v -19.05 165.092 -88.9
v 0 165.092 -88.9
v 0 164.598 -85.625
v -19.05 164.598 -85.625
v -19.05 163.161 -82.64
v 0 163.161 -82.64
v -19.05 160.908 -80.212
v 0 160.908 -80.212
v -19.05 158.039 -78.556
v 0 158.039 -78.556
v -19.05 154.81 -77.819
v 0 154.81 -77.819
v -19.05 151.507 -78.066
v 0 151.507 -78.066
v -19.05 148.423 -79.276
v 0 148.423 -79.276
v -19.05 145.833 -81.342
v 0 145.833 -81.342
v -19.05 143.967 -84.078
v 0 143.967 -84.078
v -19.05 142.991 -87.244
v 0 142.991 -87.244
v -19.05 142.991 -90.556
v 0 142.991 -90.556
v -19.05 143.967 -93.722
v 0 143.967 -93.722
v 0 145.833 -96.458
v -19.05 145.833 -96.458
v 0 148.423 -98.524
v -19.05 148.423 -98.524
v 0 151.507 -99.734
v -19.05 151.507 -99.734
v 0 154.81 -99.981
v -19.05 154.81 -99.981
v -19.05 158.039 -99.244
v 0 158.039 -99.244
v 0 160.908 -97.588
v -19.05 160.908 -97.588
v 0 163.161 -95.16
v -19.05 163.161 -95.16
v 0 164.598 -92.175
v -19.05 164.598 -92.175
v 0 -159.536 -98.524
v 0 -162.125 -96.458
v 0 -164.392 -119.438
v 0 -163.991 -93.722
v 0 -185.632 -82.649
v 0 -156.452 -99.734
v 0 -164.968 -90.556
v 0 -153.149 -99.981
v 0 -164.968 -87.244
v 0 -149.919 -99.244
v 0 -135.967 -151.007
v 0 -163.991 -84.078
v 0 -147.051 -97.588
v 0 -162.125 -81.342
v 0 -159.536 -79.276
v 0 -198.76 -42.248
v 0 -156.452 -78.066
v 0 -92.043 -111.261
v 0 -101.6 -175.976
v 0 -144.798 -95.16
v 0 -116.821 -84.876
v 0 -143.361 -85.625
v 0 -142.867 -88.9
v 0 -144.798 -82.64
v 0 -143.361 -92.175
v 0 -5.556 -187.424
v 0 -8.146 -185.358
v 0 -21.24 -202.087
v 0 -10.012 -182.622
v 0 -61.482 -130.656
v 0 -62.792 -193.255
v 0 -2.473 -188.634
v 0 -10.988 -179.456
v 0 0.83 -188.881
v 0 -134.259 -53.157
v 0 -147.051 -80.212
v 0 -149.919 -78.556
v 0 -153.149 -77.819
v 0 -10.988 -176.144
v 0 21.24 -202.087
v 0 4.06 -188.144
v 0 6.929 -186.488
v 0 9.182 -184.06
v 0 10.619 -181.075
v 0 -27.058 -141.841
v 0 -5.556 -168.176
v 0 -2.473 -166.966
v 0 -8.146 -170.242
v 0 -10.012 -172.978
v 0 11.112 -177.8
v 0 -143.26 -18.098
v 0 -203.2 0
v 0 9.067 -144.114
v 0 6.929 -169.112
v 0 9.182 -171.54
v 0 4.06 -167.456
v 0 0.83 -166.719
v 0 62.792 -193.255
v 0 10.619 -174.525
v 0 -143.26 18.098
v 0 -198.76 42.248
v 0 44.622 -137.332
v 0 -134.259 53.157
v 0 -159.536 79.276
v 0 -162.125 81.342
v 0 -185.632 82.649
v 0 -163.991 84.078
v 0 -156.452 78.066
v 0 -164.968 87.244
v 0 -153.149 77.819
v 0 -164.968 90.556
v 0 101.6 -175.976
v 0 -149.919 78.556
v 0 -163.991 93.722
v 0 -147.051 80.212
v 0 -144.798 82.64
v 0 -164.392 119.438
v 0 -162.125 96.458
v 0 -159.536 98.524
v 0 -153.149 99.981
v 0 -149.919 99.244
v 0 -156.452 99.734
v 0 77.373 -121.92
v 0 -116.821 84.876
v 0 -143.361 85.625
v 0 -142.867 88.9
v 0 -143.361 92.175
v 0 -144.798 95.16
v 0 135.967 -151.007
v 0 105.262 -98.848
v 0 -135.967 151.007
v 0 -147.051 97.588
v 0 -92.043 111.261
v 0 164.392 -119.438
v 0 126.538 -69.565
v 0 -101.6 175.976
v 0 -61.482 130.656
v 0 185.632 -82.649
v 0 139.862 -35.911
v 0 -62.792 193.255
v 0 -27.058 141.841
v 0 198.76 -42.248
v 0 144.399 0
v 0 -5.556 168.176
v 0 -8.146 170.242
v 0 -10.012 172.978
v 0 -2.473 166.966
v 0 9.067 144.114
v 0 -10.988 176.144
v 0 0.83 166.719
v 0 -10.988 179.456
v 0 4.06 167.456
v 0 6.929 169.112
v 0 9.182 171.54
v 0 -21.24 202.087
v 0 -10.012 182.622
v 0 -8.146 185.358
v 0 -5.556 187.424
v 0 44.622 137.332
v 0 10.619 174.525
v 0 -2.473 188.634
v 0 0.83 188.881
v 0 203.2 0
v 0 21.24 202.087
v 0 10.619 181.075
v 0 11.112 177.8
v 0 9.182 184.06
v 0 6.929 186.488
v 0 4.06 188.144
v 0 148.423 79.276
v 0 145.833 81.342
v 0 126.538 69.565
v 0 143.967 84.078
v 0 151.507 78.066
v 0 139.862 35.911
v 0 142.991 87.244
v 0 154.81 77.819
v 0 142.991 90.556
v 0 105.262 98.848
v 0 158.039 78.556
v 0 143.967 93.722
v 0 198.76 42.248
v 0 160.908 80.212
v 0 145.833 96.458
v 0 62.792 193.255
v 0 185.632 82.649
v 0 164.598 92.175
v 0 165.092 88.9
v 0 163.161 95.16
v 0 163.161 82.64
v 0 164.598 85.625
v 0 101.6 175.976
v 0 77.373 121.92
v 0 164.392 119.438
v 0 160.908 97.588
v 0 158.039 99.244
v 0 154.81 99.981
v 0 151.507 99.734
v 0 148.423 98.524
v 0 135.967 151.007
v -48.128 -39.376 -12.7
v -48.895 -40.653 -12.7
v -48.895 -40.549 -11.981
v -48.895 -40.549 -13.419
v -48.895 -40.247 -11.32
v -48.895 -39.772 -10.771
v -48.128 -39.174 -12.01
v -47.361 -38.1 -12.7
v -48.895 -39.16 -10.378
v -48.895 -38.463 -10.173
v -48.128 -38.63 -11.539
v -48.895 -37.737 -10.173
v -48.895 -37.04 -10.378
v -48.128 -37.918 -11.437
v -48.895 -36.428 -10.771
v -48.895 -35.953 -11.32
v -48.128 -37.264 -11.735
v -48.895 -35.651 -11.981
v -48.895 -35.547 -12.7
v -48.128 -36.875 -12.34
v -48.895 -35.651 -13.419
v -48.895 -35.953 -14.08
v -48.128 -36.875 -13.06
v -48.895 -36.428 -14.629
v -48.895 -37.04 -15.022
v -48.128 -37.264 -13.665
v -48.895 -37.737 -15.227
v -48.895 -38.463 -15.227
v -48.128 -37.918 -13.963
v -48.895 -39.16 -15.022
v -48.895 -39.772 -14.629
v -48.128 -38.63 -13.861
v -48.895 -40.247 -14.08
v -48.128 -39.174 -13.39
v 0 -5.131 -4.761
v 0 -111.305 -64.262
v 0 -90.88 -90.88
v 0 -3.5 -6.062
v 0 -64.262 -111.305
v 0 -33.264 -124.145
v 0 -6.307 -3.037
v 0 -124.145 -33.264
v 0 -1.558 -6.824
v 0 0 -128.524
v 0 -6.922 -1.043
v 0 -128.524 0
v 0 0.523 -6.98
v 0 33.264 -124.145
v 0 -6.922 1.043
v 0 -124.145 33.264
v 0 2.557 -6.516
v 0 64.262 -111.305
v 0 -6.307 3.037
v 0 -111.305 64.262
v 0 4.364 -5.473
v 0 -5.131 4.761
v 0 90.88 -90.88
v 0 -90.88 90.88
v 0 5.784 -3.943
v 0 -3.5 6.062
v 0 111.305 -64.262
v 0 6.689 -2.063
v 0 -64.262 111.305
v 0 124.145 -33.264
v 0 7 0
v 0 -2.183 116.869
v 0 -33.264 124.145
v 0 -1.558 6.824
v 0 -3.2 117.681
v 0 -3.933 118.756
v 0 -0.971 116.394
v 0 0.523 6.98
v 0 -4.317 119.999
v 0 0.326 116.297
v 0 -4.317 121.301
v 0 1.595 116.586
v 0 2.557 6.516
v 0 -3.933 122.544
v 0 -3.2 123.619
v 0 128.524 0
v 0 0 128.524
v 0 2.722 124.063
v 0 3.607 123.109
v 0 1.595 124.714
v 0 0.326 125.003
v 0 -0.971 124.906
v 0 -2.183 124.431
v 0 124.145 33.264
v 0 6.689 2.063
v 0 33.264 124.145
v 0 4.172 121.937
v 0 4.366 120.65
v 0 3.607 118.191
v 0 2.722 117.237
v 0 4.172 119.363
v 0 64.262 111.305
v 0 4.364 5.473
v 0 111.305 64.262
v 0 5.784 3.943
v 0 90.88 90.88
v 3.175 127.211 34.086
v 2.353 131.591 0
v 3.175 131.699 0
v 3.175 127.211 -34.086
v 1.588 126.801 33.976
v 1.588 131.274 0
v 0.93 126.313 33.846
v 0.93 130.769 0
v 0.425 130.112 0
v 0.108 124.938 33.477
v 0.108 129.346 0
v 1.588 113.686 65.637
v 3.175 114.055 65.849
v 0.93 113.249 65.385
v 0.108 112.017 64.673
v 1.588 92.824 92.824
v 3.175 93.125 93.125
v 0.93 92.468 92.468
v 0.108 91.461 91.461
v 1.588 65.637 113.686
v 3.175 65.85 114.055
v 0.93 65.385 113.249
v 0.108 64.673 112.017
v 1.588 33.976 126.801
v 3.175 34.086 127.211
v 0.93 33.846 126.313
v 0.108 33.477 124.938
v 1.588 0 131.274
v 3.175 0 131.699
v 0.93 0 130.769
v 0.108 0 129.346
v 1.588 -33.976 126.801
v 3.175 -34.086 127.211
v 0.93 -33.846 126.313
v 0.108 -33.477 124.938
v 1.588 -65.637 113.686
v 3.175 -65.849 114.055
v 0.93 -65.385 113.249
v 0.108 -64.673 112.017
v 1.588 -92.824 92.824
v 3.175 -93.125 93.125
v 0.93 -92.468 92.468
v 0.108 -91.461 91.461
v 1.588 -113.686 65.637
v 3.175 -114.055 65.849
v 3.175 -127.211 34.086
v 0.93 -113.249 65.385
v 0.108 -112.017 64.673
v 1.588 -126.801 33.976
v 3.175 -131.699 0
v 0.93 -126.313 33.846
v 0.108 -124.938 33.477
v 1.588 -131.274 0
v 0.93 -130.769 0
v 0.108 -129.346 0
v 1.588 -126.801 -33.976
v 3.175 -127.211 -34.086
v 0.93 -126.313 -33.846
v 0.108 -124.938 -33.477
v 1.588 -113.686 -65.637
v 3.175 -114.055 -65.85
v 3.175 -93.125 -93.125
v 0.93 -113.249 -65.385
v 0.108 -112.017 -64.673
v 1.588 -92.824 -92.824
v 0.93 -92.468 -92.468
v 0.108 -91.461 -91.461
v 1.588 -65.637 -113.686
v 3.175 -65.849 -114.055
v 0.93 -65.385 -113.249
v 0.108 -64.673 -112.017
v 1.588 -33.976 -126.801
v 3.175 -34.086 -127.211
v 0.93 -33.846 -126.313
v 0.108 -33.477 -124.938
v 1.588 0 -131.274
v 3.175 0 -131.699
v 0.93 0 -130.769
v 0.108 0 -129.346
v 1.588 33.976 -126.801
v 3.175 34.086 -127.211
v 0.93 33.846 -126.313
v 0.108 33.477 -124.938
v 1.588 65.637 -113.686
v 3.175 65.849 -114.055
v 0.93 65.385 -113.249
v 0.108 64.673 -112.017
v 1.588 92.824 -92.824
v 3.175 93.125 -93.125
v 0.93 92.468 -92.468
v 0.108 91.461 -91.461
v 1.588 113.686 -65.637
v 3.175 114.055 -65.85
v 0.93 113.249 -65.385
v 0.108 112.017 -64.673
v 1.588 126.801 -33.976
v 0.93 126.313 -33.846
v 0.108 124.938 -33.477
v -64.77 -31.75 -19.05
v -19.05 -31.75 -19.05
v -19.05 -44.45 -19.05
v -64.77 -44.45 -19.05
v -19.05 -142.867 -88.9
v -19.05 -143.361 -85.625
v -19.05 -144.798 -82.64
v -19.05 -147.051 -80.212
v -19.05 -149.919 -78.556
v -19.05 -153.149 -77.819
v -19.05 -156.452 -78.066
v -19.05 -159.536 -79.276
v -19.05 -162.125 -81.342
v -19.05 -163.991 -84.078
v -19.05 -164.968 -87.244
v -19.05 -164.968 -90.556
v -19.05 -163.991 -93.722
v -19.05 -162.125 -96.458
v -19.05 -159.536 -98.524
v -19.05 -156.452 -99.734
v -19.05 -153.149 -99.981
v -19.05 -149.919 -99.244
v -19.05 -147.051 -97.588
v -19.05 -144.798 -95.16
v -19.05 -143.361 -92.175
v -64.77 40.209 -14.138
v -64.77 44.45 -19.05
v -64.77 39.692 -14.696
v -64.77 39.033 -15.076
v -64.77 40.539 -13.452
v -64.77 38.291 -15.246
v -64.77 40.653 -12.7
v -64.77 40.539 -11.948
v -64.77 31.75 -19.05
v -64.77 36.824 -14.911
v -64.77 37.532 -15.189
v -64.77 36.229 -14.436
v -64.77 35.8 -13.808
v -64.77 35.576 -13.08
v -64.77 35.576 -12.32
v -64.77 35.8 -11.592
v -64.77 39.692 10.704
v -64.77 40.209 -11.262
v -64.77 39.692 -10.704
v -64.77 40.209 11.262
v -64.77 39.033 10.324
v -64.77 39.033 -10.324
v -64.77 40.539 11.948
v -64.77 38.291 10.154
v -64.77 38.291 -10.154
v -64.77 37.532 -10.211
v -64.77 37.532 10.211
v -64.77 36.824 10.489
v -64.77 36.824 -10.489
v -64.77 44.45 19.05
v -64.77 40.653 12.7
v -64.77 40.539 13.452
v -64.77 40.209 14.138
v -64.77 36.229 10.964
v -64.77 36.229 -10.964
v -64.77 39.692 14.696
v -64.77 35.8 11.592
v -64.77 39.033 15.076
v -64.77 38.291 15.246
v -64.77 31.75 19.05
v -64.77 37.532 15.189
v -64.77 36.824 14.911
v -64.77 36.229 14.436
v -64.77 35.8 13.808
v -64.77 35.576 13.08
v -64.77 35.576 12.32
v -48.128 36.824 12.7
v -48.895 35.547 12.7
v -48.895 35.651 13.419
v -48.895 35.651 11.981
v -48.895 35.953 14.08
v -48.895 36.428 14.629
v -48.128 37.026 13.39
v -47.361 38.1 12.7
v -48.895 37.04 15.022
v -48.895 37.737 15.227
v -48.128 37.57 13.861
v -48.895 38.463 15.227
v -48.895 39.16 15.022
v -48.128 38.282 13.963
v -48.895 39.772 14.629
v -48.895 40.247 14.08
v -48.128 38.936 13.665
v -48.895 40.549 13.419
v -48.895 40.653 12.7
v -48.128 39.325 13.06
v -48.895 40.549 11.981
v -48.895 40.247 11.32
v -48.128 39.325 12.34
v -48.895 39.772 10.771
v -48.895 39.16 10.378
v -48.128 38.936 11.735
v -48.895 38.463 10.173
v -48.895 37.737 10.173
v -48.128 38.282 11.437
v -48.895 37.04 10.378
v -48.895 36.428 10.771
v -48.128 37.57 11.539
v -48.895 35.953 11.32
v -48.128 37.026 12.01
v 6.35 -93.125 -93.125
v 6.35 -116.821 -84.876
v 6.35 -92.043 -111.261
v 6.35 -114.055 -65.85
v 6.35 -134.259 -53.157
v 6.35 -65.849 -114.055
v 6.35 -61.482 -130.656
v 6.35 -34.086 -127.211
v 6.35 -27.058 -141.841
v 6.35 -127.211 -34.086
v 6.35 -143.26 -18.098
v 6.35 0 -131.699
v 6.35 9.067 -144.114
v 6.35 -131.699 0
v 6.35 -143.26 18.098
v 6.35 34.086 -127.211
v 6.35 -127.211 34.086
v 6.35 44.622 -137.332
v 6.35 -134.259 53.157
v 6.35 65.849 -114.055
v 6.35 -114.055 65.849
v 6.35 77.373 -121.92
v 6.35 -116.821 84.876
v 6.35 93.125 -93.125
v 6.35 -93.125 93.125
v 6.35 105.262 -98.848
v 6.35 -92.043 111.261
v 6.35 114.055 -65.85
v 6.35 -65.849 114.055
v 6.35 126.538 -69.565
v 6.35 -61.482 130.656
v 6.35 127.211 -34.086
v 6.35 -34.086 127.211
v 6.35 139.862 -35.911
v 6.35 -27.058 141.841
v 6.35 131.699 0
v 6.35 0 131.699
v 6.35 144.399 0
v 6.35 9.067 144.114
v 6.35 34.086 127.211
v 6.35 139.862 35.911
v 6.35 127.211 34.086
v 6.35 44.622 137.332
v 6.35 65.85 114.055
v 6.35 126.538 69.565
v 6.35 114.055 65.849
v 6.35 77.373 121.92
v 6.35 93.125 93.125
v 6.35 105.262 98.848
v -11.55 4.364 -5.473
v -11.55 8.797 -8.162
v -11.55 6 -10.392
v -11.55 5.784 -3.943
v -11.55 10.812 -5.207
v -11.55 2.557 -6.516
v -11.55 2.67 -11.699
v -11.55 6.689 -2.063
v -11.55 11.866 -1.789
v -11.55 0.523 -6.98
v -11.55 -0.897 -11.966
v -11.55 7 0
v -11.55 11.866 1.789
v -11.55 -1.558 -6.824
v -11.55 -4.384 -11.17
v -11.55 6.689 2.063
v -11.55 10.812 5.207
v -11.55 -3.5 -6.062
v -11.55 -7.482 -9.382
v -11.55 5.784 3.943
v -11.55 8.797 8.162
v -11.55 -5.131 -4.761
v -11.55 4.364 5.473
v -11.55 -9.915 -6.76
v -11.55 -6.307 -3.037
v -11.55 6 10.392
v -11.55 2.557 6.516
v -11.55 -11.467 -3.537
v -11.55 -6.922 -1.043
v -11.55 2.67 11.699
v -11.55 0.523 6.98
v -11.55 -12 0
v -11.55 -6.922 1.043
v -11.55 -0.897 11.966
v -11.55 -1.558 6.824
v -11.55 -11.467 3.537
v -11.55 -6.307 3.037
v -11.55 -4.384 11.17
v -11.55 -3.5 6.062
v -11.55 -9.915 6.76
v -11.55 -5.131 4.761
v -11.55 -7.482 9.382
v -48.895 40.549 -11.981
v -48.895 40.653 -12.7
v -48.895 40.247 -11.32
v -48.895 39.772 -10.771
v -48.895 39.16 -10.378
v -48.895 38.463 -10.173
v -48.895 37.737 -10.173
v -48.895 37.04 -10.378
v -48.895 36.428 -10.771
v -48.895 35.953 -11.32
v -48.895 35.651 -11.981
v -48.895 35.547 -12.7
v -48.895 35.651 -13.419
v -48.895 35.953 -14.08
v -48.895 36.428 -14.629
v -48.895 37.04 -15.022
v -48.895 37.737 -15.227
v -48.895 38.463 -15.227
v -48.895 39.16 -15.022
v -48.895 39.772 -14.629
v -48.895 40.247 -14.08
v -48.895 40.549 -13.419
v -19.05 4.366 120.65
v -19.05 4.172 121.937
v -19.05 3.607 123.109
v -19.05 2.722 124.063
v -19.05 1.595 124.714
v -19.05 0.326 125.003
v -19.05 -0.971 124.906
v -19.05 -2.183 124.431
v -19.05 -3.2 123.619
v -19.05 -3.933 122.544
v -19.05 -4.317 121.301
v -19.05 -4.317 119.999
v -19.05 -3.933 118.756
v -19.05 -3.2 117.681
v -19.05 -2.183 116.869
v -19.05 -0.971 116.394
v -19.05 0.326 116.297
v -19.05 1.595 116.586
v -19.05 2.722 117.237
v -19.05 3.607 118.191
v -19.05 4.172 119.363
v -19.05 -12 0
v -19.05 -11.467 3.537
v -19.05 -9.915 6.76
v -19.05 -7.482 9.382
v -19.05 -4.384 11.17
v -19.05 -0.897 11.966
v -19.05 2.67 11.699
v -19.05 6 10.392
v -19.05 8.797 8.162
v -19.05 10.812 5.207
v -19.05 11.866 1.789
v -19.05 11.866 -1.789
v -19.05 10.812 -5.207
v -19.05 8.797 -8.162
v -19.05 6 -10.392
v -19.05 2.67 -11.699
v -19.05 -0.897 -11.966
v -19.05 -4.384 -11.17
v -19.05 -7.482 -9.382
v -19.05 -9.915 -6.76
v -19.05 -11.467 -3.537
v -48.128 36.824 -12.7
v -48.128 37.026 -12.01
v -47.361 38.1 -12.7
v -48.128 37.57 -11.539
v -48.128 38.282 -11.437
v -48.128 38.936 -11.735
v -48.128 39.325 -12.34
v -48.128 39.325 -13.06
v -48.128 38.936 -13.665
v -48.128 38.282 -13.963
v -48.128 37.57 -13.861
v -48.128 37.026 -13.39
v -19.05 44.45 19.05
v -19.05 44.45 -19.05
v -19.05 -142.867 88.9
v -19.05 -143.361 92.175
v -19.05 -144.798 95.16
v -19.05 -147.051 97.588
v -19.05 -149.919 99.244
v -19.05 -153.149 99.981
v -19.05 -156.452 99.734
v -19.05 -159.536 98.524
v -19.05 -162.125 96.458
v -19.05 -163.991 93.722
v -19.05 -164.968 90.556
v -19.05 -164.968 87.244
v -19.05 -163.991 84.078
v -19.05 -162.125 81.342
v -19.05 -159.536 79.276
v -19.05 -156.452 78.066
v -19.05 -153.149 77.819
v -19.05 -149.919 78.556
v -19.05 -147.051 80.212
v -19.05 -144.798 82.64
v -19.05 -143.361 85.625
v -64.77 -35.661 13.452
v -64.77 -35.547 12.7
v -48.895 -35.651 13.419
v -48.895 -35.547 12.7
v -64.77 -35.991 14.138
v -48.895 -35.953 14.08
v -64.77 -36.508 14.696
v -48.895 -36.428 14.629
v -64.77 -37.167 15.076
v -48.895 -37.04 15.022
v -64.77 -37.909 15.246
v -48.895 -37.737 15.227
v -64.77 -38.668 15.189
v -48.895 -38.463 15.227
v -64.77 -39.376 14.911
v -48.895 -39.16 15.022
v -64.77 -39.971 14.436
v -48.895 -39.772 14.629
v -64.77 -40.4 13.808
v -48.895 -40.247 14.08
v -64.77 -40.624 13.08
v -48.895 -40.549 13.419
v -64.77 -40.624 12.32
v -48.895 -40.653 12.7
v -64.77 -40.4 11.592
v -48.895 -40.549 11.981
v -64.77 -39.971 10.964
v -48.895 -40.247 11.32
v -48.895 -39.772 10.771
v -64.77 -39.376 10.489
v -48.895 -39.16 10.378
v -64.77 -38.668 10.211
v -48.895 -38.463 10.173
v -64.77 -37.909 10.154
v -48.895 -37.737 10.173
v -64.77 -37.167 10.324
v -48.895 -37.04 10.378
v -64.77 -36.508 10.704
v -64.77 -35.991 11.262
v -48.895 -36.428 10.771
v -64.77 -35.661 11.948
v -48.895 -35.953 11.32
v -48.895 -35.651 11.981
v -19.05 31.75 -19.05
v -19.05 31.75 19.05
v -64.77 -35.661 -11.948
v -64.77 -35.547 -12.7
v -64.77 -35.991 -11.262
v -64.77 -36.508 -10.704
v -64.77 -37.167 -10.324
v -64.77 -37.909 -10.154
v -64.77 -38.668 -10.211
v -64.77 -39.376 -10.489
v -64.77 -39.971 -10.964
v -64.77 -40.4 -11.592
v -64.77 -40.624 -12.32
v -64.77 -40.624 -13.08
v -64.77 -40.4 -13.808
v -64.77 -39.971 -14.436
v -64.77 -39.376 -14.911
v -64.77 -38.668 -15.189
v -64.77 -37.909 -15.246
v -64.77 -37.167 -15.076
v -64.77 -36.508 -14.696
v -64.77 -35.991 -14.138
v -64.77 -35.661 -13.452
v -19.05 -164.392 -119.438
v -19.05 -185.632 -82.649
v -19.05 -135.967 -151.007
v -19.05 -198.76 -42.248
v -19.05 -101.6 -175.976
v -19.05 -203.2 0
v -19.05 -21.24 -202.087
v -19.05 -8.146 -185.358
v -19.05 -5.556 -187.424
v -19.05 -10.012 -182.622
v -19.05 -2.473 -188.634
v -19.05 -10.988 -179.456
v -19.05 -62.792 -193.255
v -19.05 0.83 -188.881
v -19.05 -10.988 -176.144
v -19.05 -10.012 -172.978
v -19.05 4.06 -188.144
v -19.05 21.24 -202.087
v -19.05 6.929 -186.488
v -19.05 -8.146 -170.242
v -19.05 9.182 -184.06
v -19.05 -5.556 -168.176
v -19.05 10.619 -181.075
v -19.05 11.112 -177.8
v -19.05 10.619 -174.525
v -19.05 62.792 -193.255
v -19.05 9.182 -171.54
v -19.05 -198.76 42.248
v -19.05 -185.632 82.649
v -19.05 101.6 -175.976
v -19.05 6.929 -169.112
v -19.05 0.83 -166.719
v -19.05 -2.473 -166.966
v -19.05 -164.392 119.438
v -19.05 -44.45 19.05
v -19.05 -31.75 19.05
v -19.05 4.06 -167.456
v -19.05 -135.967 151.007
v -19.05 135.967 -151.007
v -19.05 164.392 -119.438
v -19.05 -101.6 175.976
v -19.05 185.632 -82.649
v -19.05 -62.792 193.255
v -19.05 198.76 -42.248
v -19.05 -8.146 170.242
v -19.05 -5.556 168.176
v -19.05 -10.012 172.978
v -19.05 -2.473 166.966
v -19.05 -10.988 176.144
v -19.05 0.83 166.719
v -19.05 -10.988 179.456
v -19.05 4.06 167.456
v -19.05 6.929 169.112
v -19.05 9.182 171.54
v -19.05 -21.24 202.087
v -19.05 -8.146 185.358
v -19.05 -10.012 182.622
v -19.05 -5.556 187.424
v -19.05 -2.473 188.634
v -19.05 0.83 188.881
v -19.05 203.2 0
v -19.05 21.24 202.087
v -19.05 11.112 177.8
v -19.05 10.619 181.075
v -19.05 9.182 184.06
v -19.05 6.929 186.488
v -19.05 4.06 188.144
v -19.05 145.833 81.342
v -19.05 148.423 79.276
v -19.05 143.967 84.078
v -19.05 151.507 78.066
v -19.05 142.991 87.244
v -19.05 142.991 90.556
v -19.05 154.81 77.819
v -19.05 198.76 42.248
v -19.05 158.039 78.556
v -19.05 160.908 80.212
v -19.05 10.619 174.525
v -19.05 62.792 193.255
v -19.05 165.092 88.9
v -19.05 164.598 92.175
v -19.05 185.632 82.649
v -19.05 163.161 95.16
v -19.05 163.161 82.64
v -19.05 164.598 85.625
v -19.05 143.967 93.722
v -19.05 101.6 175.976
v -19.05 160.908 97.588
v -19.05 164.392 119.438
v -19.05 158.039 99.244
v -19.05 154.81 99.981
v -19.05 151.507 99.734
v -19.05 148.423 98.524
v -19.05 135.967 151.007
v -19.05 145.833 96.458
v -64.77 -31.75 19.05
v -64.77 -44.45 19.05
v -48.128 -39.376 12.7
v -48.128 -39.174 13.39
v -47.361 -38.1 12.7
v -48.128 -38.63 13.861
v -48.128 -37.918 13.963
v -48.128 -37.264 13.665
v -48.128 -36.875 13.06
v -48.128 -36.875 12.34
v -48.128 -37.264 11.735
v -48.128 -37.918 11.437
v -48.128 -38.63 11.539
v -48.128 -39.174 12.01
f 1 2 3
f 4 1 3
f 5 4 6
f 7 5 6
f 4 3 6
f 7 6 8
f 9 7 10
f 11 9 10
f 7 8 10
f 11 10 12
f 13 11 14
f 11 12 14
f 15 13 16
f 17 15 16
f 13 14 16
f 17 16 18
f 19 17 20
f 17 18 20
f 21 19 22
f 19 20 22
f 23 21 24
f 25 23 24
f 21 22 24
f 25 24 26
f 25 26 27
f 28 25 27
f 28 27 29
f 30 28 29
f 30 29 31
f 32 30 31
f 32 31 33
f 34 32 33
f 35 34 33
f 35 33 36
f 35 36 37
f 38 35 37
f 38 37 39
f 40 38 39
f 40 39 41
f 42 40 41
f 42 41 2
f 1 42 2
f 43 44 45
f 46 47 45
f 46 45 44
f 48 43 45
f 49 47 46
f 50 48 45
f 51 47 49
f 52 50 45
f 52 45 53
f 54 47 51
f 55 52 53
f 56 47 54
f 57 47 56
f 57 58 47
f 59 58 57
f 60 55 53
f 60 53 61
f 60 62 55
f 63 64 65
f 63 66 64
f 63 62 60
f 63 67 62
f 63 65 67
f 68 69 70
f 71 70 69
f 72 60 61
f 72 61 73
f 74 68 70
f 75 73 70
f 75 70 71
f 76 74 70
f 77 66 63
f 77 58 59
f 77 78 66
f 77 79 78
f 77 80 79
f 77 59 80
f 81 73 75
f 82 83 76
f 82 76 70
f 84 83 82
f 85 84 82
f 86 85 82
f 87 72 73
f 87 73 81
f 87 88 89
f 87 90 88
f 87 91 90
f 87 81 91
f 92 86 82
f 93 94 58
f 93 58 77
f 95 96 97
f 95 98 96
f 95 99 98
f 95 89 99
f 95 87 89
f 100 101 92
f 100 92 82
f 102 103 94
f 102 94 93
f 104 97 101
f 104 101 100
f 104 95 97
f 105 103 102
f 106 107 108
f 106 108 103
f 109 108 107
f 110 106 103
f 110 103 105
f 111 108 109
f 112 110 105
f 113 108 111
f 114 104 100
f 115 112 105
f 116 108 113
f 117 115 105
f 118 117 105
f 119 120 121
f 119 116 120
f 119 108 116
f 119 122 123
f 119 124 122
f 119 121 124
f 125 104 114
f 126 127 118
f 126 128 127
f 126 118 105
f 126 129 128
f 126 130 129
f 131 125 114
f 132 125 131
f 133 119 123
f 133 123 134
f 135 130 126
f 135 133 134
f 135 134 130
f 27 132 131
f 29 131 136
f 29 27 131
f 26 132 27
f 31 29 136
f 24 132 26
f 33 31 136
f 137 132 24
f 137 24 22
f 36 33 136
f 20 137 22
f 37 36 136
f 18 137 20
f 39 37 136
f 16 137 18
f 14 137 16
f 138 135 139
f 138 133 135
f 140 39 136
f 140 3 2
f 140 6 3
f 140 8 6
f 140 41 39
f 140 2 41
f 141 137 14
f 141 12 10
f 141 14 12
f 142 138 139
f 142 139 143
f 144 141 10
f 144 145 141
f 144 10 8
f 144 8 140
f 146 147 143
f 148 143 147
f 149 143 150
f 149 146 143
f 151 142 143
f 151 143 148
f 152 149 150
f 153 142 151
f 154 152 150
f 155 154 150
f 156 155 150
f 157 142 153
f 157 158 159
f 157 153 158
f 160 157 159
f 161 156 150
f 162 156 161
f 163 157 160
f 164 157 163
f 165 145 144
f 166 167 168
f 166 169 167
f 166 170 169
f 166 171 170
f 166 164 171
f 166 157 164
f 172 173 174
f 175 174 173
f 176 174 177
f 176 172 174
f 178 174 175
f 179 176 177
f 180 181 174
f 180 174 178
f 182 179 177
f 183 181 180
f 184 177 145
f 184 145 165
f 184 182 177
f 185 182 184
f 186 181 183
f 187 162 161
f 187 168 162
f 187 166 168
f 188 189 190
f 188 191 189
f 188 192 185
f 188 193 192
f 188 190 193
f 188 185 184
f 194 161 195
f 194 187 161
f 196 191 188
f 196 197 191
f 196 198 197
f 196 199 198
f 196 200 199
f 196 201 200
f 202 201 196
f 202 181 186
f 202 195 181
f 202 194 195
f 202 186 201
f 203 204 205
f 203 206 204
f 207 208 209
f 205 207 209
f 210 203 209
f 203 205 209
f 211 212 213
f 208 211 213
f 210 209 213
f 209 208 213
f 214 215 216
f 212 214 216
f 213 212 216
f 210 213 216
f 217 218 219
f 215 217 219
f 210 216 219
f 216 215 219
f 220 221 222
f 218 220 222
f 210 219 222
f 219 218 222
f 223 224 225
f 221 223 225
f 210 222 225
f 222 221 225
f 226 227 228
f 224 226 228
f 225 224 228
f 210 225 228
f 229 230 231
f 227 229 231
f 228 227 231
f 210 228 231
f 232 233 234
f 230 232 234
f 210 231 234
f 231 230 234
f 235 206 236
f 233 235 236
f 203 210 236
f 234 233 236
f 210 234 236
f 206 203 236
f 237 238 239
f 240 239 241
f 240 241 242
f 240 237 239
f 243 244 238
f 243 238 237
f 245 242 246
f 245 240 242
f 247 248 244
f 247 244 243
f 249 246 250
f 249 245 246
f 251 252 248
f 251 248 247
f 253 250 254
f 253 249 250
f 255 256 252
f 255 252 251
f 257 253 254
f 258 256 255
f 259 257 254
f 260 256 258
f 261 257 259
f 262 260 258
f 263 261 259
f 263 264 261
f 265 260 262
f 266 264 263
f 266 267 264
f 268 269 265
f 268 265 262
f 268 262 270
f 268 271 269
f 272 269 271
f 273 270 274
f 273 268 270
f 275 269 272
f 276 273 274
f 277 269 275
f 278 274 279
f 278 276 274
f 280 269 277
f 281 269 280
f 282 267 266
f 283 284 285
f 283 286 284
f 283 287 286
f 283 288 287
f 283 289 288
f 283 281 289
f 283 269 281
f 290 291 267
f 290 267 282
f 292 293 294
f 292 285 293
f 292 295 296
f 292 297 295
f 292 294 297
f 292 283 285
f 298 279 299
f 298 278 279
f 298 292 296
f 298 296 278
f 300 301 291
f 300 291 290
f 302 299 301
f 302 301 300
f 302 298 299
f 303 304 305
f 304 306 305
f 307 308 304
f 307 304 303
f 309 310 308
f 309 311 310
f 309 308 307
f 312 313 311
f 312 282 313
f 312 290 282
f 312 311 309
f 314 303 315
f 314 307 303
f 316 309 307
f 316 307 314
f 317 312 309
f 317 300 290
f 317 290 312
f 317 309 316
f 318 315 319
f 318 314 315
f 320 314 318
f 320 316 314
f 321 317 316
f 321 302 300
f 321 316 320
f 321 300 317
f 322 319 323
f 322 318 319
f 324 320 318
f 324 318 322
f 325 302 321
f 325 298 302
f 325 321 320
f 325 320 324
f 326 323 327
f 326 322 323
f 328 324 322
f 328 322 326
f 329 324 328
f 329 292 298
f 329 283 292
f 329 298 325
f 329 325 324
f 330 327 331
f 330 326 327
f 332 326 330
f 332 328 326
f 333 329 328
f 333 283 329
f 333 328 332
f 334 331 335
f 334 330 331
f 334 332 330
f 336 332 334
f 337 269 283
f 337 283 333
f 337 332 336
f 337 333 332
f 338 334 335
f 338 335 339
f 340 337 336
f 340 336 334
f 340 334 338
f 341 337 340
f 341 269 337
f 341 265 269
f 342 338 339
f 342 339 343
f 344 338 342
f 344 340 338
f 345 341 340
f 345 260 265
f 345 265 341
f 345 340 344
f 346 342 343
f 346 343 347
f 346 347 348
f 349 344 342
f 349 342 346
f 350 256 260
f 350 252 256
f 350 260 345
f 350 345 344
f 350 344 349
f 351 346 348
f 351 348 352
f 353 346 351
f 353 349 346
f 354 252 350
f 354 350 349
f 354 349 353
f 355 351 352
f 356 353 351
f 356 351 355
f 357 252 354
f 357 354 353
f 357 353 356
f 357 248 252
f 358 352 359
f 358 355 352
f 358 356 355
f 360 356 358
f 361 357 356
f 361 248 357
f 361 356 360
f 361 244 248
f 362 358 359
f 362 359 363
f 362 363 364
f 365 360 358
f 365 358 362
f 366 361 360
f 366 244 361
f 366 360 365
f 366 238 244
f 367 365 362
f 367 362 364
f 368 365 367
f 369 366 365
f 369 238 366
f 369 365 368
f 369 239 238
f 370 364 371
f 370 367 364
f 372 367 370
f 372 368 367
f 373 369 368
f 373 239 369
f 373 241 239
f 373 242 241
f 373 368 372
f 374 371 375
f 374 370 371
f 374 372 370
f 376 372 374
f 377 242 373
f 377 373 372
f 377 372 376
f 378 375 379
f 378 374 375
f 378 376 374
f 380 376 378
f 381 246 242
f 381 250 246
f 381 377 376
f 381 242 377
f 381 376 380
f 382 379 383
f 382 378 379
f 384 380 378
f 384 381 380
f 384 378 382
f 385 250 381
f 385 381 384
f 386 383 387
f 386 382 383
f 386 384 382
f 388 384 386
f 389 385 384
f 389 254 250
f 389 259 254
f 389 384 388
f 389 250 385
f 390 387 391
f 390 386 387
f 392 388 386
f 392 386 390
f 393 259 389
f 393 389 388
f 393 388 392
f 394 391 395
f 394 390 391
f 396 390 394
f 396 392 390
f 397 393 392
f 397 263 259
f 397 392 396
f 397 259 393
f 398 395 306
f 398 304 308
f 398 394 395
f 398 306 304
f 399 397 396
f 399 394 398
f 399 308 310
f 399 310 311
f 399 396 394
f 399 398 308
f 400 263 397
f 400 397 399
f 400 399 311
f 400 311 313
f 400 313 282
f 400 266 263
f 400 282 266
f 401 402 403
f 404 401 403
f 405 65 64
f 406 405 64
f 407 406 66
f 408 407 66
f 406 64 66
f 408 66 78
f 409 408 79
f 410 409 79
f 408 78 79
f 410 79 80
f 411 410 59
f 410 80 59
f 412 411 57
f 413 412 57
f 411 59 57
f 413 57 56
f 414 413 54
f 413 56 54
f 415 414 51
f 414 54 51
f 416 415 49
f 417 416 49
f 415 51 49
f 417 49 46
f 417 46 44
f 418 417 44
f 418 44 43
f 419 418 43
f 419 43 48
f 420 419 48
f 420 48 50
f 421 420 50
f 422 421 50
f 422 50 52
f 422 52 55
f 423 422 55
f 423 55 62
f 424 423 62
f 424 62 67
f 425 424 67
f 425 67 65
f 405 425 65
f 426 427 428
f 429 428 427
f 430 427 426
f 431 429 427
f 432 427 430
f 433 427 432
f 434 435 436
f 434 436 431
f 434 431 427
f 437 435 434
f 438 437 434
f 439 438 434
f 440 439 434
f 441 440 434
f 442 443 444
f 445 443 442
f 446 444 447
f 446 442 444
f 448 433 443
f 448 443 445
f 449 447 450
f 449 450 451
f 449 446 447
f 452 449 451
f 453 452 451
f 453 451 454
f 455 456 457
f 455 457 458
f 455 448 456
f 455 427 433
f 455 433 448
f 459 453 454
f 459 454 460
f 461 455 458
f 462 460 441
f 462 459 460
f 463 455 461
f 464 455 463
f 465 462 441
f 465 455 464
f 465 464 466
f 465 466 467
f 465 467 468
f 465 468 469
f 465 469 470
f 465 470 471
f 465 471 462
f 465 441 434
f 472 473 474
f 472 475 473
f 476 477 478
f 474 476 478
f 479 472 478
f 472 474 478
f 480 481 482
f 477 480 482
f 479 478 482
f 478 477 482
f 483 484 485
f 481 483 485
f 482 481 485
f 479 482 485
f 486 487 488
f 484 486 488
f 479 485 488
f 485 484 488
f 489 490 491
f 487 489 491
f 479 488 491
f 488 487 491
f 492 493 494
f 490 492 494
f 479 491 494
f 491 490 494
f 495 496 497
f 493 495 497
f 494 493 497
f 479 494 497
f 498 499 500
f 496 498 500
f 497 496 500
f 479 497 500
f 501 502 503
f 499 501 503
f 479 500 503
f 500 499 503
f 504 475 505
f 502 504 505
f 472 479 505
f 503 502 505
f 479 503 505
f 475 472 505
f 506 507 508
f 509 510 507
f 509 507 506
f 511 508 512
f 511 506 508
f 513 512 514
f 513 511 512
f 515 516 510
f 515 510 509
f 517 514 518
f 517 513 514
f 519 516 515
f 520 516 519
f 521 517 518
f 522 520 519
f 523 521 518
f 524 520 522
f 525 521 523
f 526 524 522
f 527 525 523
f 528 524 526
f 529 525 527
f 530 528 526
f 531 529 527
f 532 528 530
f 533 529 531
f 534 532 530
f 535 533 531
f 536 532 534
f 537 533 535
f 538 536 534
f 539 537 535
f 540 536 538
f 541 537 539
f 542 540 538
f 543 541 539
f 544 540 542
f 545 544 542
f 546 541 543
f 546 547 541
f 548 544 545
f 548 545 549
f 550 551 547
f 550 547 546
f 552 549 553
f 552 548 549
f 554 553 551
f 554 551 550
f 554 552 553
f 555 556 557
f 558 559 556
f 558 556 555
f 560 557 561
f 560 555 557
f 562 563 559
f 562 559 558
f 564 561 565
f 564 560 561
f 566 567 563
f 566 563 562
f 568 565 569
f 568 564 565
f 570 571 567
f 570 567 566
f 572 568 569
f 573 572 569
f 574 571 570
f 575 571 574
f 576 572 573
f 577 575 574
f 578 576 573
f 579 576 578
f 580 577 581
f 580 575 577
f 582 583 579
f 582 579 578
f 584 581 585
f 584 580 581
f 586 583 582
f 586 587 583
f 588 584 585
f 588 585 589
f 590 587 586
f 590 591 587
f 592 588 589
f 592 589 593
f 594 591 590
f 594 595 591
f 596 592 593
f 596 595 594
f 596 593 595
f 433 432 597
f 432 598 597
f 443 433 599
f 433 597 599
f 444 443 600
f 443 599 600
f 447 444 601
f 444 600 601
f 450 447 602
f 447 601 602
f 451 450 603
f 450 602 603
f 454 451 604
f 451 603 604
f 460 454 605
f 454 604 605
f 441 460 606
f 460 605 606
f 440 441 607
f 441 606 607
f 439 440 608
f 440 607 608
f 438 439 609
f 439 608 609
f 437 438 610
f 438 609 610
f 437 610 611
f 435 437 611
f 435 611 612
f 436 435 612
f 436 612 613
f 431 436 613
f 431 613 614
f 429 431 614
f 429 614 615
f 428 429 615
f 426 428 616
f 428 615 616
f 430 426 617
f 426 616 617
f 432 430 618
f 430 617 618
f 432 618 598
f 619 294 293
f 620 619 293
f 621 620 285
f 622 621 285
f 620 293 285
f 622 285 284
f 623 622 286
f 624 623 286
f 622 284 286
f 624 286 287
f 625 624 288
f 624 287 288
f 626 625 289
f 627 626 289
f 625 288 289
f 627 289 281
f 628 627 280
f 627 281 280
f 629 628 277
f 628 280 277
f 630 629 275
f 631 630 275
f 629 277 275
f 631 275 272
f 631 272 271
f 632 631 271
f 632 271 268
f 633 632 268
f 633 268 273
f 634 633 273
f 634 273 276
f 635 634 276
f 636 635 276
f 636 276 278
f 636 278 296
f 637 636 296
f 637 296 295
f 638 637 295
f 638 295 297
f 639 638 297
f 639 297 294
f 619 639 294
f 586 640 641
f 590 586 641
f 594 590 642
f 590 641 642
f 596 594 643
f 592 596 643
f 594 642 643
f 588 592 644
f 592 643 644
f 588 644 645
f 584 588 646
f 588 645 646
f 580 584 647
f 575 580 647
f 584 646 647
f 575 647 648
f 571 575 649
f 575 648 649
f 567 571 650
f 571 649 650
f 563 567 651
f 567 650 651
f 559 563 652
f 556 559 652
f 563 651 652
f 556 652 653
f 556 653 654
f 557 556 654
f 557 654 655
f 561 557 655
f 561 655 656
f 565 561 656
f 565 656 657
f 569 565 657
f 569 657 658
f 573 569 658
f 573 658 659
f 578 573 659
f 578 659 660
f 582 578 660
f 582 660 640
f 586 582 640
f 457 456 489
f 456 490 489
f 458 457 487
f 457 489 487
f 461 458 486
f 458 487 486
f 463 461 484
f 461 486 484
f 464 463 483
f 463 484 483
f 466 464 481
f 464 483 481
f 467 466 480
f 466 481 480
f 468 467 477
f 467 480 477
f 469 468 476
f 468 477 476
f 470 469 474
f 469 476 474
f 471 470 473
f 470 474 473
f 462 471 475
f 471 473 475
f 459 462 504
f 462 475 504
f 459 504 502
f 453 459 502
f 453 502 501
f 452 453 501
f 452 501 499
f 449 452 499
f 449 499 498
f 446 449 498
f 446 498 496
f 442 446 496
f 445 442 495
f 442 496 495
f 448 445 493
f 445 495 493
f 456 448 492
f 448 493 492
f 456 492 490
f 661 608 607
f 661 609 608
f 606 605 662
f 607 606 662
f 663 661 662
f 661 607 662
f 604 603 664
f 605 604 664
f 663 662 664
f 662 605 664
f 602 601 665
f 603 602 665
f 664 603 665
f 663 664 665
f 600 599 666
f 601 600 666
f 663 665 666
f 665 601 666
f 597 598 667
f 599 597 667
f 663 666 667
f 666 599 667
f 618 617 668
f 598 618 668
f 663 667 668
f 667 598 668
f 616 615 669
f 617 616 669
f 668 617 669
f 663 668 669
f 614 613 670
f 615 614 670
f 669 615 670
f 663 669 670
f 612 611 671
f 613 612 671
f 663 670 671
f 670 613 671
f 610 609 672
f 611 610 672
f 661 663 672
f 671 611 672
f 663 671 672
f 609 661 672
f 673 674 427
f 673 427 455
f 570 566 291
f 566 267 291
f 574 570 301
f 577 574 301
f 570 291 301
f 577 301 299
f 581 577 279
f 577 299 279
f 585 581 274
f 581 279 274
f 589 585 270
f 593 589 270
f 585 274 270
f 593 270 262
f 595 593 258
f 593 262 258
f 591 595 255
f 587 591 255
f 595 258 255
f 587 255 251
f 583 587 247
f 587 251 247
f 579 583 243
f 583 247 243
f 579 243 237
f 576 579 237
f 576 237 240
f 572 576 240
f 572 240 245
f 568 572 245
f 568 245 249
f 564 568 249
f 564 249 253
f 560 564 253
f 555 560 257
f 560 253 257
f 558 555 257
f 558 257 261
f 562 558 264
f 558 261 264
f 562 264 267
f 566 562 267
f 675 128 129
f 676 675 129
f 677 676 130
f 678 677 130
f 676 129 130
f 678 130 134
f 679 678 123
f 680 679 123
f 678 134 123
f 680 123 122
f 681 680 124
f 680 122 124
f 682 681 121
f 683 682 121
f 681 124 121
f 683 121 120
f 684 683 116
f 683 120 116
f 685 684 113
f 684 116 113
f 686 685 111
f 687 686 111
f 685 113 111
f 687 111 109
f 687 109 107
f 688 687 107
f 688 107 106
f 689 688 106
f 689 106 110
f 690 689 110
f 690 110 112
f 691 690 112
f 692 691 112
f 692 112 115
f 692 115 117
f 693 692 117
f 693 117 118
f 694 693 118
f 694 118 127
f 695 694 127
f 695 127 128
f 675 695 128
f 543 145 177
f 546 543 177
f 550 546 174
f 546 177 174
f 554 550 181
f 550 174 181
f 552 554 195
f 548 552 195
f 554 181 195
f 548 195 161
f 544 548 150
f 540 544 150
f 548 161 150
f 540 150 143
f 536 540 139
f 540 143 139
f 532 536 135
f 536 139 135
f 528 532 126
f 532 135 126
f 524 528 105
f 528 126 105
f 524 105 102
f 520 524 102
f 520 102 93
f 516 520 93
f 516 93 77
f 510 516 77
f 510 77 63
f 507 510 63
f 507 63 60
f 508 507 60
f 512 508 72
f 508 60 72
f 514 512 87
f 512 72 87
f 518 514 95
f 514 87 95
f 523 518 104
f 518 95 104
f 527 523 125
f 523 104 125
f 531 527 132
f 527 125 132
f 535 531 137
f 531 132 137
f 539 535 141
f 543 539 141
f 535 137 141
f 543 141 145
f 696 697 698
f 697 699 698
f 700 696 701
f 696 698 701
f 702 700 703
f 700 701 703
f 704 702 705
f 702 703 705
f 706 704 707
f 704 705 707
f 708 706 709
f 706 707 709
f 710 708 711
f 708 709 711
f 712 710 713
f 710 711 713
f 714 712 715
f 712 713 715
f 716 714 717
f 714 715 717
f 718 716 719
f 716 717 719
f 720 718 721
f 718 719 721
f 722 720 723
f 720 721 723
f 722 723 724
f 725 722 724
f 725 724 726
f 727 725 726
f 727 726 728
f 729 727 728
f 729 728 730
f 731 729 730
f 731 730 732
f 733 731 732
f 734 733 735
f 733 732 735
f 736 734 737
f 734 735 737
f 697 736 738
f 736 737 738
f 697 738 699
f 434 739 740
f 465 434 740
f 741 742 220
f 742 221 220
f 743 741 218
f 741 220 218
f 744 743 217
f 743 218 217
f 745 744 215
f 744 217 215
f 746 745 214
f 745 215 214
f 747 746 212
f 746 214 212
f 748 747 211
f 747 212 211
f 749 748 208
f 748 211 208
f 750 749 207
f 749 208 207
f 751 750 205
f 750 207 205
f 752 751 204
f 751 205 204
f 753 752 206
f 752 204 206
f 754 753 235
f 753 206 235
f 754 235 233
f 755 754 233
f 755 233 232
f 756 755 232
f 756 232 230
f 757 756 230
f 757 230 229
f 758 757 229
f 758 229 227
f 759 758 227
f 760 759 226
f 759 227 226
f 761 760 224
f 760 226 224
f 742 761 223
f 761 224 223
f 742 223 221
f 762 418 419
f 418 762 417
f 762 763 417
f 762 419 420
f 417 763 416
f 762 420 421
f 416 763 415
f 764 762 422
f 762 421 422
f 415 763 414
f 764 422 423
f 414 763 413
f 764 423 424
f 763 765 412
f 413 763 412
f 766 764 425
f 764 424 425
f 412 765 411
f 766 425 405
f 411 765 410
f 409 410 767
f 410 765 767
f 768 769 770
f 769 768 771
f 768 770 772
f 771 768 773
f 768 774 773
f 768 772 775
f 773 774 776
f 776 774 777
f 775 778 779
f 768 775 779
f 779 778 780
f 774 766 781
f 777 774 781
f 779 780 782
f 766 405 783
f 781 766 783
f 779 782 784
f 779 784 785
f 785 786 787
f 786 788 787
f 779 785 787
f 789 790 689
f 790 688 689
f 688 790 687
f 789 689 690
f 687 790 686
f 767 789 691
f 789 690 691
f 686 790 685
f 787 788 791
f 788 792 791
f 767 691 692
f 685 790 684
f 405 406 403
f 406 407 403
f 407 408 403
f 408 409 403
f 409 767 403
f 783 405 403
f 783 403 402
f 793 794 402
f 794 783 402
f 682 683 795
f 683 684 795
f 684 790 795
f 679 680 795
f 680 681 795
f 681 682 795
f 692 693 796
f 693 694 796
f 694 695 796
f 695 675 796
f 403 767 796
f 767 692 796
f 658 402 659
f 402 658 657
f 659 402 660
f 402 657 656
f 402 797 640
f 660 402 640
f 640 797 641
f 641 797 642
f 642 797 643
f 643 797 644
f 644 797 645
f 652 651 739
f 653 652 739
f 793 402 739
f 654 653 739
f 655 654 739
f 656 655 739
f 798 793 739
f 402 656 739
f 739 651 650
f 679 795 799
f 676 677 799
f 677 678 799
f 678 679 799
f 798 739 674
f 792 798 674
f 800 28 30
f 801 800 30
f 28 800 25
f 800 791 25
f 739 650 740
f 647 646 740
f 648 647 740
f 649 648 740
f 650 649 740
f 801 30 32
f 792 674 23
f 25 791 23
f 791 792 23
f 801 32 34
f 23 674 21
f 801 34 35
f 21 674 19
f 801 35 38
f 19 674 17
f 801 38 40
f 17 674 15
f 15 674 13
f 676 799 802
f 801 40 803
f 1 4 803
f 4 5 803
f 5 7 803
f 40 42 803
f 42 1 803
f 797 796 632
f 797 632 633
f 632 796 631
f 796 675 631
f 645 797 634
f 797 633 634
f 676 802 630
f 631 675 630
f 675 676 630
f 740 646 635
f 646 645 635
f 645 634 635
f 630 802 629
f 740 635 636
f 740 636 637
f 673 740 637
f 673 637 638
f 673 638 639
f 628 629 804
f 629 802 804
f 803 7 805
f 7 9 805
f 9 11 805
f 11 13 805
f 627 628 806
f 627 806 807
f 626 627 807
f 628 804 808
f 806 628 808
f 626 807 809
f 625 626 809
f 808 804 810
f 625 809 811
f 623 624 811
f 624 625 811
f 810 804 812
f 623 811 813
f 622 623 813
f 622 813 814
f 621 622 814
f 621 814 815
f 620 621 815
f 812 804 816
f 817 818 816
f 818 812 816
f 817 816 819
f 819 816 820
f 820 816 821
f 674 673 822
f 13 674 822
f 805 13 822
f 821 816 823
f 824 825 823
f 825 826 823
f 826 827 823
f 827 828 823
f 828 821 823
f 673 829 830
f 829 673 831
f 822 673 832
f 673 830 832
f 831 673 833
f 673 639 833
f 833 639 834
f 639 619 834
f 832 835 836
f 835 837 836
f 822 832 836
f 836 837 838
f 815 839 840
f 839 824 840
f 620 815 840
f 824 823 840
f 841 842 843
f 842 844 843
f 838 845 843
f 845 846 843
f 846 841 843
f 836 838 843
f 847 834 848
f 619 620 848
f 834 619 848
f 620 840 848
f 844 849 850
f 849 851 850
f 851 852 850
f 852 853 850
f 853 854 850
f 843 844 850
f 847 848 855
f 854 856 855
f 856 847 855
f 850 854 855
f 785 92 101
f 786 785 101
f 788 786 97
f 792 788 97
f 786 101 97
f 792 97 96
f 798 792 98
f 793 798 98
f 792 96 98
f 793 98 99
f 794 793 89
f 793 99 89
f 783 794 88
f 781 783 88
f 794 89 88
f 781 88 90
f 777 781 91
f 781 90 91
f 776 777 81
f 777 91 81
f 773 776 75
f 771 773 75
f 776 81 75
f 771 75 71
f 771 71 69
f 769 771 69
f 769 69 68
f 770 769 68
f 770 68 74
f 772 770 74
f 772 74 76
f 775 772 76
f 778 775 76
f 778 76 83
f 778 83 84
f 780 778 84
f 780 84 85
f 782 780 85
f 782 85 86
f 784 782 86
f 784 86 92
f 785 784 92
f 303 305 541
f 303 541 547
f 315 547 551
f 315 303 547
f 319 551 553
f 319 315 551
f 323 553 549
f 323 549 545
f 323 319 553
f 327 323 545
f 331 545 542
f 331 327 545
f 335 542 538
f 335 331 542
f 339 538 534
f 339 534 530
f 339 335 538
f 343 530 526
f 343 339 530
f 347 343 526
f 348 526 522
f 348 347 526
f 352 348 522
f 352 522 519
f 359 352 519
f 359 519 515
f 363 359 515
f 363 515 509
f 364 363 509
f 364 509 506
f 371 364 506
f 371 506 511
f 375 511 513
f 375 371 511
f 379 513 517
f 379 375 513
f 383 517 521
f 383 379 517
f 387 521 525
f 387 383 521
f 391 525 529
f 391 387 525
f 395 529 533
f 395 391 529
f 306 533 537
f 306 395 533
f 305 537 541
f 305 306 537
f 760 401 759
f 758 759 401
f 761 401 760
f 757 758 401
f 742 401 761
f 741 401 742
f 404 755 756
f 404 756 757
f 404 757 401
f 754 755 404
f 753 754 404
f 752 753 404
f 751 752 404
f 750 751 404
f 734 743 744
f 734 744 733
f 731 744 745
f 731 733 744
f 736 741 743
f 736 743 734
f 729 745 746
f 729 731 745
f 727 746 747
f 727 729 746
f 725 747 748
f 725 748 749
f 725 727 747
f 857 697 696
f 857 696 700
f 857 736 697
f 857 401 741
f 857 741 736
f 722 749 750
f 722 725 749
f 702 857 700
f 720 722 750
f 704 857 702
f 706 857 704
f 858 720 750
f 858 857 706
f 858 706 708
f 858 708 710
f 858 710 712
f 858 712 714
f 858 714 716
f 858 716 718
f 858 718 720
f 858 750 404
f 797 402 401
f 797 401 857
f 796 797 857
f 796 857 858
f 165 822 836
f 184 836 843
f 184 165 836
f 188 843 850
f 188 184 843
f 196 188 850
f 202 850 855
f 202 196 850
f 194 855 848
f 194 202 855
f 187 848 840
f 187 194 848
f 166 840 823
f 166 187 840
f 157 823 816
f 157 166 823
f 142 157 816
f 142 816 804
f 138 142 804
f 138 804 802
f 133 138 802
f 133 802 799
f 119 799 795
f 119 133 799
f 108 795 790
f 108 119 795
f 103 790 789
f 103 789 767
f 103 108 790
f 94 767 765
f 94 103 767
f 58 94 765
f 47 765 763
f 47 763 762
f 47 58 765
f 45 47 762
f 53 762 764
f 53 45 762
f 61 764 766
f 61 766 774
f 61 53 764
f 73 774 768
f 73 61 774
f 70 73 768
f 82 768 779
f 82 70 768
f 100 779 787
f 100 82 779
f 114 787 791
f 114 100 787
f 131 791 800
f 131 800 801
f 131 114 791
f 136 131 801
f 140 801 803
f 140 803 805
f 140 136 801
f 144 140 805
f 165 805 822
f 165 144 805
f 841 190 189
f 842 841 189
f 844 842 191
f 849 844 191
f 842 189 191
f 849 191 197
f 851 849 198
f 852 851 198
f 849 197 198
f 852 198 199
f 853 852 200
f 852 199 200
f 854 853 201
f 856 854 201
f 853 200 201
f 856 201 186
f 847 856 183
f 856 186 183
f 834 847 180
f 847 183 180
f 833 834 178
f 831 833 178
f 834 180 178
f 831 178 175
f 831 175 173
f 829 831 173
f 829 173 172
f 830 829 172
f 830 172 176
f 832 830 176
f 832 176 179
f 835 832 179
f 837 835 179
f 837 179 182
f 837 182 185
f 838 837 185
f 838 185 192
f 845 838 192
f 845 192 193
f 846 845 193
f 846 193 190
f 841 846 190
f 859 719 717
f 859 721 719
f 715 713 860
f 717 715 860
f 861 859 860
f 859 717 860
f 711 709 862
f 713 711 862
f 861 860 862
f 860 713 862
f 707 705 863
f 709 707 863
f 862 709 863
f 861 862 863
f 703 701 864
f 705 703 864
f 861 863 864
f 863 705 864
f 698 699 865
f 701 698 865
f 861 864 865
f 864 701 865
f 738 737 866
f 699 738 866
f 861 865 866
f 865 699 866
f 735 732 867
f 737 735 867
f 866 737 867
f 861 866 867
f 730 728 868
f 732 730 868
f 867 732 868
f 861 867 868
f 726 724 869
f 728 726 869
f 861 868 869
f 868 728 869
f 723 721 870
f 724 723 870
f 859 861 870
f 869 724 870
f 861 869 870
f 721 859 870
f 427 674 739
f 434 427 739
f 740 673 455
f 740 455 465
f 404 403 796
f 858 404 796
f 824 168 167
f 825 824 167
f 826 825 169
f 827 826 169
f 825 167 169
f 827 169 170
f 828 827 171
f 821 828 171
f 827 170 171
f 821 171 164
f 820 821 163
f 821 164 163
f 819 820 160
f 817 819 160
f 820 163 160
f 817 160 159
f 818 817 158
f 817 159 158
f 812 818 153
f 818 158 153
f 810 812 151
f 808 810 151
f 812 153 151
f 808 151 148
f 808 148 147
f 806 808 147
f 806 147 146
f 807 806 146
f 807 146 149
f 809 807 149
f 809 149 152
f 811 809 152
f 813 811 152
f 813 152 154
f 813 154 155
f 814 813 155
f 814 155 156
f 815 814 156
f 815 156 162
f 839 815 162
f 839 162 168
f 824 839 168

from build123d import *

# Parameters (mm, degrees)
F0_R           = 203.2
F1_DEPTH       = 19.05
F2_R           = 144.399
F2_R_2         = 131.699
F3_DEPTH       = 6.35
F4_R           = 3.175
F6_D           = 22.225
F8_D           = 14
F8_CBORE_D     = 24
F8_CBORE_DEPTH = 7.5
F9_W           = 12.7
F9_H           = 38.1
F10_DEPTH      = 45.72
F12_D          = 5.1054
F12_DEPTH      = 15.875
F12_TIP        = 1.5338169022
F14_D          = 8.73125


# Not quite as in the source:
# - a length typed as a fraction of an inch, garbled in the dataset ("3 / 203.2 mm" for 3/8 in), is restored


with BuildPart() as f1:
    # F0 (on Right) → F1 (new body)
    with BuildSketch(Plane.YZ):
        Circle(F0_R)
    extrude(amount=-F1_DEPTH)

    # F2 (on face) → F3 (join)
    with BuildSketch(Plane.YZ):
        Circle(F2_R)
        Circle(F2_R_2, mode=Mode.SUBTRACT)
    extrude(amount=F3_DEPTH)

    # F4
    f4_edges = [f1.edges().sort_by_distance(p)[0] for p in [
        (0, -131.699, 0),
    ]]
    fillet(f4_edges, radius=F4_R)

    # F6 (through all)
    with Locations(Plane(origin=(-19.05, 0, 0), x_dir=(0, -1, 0), z_dir=(-1, 0, 0))):
        with Locations((0, 177.8), (153.9793167929, 88.9), (-153.9793167929, 88.9), (-153.9793167929, -88.9), (153.9793167929, -88.9), (0, -177.8)):
            Hole(F6_D / 2)

    # F8 (through all)
    with Locations(Plane(origin=(-19.05, 0, 0), x_dir=(0, -1, 0), z_dir=(-1, 0, 0))):
        with Locations((0, 0)):
            CounterBoreHole(F8_D / 2, F8_CBORE_D / 2, F8_CBORE_DEPTH)

    # F9 (on face) → F10 (join)
    with BuildSketch(Plane(origin=(-19.05, 0, 0), x_dir=(0, -1, 0), z_dir=(-1, 0, 0))):
        with Locations((38.1, 0)):
            Rectangle(F9_W, F9_H)
        with Locations((-38.1, 0)):
            Rectangle(F9_W, F9_H)
    extrude(amount=F10_DEPTH)

    # F12
    with Locations(Plane(origin=(-64.77, 0, 0), x_dir=(0, -1, 0), z_dir=(-1, 0, 0))):
        with Locations((-38.1, 12.7), (-38.1, -12.7), (38.1, 12.7), (38.1, -12.7)):
            Hole(F12_D / 2, depth=F12_DEPTH)
            with Locations((0, 0, -(F12_DEPTH + F12_TIP / 2))):  # 118° drill point
                Cone(0, F12_D / 2, F12_TIP, mode=Mode.SUBTRACT)

    # F14 (through all)
    with Locations(Plane(origin=(-19.05, 0, 0), x_dir=(0, -1, 0), z_dir=(-1, 0, 0))):
        with Locations((0, 120.65)):
            Hole(F14_D / 2)


solid = f1.part
